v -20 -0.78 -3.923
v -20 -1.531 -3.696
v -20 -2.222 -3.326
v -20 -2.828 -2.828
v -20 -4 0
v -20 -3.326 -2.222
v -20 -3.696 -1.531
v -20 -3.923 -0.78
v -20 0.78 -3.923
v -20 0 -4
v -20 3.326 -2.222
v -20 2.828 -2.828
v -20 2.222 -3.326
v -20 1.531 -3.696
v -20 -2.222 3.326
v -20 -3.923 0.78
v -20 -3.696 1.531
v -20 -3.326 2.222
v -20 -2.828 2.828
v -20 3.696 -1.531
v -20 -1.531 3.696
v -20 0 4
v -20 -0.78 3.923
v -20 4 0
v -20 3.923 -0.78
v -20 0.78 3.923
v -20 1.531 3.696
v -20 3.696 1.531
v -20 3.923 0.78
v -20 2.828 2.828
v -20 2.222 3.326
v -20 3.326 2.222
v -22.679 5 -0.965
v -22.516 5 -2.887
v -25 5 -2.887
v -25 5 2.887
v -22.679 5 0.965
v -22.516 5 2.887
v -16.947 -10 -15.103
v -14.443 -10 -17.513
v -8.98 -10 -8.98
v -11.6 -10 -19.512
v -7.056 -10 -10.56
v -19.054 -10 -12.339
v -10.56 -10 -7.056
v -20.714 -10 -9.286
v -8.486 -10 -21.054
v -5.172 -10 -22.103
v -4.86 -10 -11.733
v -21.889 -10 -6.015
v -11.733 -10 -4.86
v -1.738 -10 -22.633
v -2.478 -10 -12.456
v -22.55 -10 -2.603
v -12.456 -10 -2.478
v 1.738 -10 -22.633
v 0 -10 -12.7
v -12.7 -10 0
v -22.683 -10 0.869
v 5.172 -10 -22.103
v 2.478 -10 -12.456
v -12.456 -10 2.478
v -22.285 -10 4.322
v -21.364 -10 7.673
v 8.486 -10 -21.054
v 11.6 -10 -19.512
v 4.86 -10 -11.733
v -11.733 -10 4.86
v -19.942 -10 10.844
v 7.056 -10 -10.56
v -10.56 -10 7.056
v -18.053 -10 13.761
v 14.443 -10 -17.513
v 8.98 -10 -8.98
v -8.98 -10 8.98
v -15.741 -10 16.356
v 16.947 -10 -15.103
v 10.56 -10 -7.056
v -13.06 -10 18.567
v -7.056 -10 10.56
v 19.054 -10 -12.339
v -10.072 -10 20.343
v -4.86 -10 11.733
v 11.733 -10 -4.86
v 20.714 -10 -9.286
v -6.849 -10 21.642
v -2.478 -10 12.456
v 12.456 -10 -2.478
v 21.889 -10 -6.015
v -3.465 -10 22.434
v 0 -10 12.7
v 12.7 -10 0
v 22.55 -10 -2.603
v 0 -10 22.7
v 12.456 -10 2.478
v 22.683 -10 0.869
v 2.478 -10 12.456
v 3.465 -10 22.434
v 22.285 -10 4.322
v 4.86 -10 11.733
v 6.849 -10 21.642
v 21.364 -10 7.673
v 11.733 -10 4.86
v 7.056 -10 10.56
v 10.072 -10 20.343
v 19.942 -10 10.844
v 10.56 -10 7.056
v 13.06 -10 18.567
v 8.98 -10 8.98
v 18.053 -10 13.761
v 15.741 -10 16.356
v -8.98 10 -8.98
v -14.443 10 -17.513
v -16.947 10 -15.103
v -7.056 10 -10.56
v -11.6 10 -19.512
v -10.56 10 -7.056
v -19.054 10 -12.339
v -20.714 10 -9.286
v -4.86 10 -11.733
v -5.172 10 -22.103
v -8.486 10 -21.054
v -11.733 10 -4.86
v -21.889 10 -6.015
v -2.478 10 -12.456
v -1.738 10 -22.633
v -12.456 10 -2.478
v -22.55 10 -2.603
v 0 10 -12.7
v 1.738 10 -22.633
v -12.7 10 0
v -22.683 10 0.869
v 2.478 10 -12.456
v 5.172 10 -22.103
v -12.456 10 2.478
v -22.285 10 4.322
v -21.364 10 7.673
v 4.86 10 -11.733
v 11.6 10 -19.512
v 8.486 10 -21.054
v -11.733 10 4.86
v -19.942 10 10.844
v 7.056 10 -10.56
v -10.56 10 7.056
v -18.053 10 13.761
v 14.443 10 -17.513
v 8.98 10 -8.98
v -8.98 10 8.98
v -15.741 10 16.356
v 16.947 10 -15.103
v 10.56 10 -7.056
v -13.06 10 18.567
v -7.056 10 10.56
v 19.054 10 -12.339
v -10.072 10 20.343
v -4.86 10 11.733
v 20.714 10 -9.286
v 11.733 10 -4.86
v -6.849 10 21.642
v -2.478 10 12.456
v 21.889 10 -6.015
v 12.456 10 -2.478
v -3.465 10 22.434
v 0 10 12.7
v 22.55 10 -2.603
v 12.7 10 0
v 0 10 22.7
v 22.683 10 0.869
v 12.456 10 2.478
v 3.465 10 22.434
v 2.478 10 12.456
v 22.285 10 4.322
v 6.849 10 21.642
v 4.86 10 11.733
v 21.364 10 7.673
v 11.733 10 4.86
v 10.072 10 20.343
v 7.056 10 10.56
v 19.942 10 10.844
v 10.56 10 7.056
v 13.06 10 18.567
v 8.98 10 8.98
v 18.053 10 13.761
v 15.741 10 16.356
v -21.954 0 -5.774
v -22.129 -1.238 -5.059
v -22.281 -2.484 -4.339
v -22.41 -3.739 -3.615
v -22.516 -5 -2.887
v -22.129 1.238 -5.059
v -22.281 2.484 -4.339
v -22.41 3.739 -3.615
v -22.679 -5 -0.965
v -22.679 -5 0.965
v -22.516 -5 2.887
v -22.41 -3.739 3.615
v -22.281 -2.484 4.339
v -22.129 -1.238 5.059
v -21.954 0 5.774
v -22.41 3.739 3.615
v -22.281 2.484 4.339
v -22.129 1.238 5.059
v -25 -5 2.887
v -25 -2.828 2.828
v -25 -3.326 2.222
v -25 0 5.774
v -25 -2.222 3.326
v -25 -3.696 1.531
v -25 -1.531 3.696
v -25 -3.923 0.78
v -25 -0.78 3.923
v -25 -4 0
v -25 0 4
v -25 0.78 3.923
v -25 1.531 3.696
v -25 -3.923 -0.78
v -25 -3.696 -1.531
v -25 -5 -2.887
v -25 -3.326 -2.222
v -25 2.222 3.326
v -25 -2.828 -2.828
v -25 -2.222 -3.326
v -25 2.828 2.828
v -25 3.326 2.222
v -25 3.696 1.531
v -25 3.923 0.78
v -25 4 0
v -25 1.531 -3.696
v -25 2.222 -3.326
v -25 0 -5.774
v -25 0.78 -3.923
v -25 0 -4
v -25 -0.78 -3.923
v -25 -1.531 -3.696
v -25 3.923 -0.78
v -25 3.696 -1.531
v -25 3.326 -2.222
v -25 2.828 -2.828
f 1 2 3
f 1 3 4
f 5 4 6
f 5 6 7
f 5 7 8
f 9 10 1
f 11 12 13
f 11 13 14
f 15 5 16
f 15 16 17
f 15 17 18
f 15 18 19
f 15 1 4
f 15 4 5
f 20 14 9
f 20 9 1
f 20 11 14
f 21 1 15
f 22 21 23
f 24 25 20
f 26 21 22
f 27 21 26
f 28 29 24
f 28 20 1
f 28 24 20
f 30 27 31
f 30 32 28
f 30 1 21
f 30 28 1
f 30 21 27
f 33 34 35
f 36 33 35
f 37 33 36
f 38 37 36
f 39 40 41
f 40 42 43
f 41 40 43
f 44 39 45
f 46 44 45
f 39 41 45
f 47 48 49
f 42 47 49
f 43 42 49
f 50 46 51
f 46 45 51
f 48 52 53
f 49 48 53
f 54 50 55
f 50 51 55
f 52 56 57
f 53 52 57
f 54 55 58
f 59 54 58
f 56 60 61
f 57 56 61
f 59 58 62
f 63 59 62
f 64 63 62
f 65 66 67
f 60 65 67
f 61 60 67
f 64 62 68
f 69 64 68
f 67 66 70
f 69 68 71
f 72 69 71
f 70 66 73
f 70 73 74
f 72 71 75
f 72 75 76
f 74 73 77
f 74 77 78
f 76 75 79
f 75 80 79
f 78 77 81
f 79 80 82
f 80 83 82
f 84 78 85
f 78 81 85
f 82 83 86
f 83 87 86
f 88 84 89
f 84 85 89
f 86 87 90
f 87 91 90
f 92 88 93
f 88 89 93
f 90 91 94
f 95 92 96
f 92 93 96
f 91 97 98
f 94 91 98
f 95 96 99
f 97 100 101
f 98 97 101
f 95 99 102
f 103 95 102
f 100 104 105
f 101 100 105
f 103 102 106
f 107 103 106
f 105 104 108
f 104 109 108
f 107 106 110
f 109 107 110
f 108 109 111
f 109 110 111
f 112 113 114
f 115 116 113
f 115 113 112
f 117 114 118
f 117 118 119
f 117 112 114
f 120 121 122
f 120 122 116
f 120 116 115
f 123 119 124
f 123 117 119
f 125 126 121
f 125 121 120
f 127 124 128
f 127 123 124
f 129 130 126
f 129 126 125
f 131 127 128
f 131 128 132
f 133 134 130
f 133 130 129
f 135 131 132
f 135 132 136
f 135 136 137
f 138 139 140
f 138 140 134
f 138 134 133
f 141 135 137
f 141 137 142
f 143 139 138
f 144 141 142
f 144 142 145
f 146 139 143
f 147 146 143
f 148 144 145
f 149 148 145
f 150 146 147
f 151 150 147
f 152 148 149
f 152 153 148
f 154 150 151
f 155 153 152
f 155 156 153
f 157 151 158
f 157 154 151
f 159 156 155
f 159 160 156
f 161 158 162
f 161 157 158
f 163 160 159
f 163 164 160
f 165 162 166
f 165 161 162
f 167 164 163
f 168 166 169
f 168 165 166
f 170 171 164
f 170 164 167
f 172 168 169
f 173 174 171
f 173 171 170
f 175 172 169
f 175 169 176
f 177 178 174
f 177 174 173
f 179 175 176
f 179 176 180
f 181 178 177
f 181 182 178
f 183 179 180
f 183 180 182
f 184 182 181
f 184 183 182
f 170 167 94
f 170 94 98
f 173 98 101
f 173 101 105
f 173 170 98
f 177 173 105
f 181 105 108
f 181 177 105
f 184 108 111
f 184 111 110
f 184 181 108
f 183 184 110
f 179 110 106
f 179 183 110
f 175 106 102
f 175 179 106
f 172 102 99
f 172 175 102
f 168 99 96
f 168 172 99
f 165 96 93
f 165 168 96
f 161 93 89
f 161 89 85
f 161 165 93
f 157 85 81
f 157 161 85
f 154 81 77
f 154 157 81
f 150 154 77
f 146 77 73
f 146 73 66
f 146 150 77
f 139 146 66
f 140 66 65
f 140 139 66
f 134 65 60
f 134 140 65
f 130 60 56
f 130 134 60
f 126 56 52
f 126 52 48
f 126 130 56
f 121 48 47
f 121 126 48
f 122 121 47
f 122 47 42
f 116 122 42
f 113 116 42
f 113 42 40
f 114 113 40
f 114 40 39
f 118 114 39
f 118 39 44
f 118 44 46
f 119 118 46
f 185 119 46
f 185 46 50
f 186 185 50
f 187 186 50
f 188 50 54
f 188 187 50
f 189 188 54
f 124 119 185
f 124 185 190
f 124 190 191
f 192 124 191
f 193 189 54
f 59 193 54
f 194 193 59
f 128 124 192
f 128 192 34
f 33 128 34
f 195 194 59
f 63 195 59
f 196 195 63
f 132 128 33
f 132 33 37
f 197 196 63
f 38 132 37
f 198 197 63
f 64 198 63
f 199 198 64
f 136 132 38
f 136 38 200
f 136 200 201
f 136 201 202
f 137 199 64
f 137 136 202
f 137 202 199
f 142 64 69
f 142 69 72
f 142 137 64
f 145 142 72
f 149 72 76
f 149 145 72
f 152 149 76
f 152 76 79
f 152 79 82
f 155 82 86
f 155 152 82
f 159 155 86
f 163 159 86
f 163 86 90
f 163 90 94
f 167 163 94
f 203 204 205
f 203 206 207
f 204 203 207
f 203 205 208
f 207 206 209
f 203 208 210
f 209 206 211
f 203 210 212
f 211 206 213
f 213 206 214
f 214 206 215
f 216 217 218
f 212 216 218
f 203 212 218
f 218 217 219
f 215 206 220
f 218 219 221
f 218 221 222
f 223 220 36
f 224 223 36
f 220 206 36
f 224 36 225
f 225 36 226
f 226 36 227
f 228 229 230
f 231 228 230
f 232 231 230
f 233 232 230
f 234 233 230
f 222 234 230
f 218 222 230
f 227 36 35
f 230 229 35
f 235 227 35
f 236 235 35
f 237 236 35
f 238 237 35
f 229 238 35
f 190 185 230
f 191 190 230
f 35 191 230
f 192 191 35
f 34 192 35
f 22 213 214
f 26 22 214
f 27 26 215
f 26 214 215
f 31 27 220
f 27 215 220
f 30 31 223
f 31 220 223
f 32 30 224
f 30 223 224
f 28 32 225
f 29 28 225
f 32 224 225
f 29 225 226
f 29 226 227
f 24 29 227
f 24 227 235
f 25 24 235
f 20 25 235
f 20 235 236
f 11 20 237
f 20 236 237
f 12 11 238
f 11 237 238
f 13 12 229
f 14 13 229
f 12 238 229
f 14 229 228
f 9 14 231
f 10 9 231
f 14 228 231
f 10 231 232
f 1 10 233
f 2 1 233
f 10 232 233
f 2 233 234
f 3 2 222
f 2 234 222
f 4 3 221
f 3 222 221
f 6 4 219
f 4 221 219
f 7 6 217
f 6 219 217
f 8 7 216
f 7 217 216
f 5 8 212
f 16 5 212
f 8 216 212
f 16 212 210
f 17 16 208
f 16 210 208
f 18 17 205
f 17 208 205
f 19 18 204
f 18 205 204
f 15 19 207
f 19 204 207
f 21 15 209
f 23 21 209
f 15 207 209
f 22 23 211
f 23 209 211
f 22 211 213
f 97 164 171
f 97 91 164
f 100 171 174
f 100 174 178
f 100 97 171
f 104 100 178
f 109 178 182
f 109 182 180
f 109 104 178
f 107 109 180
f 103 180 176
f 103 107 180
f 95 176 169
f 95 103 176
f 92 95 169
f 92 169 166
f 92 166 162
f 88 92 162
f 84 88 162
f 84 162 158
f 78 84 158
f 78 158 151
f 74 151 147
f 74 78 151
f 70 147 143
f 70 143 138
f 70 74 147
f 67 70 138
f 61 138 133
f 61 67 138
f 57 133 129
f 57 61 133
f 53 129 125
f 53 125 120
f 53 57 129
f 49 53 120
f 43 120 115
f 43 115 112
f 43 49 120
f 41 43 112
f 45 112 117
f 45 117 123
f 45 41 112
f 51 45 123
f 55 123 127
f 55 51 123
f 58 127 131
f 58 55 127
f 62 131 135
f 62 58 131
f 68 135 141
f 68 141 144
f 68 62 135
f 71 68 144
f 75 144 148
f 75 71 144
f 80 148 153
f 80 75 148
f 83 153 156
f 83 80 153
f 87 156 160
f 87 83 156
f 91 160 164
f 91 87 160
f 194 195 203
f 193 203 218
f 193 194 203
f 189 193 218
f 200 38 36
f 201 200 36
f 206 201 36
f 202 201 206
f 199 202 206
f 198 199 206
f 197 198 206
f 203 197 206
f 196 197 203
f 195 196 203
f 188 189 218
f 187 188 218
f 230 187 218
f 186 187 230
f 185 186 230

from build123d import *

# Parameters (mm, degrees)
SKETCH_2_R          = 22.7
SKETCH_2_R_2        = 12.7
EXTRUDE_1_DEPTH     = 10
EXTRUDE_START       = -20
EXTRUDE_2_DEPTH     = 5
SKETCH_4_R          = 4
CUT_EXTRUDE_2_DEPTH = 5


with BuildPart() as part:
    # Эскиз2 → Бобышка-Вытянуть1 (new, symmetric)
    with BuildSketch(Plane(origin=(0, 0, 0), x_dir=(1, 0, 0), z_dir=(0, 1, 0))):
        with Locations(Location((0, 0, 0), (0, 0, 270))):
            Circle(SKETCH_2_R)
        with Locations(Location((0, 0, 0), (0, 0, 270))):
            Circle(SKETCH_2_R_2, mode=Mode.SUBTRACT)
    extrude(amount=EXTRUDE_1_DEPTH, both=True)

    # Эскиз3 → Бобышка-Вытянуть2 (add)
    with BuildSketch(Plane(origin=(0, 0, 0), x_dir=(0, 0, -1), z_dir=(1, 0, 0)).offset(EXTRUDE_START)):
        Polygon((5.773502692, 0), (2.886751346, 5), (-2.886751346, 5), (-5.773502692, 0), (-2.886751346, -5), (2.886751346, -5), align=None)
    extrude(amount=-EXTRUDE_2_DEPTH)

    # Эскиз4 → Вырез-Вытянуть2 (cut)
    with BuildSketch(Plane.ZY.offset(25)):
        Circle(SKETCH_4_R)
    extrude(amount=-CUT_EXTRUDE_2_DEPTH, mode=Mode.SUBTRACT)


solid = part.part
